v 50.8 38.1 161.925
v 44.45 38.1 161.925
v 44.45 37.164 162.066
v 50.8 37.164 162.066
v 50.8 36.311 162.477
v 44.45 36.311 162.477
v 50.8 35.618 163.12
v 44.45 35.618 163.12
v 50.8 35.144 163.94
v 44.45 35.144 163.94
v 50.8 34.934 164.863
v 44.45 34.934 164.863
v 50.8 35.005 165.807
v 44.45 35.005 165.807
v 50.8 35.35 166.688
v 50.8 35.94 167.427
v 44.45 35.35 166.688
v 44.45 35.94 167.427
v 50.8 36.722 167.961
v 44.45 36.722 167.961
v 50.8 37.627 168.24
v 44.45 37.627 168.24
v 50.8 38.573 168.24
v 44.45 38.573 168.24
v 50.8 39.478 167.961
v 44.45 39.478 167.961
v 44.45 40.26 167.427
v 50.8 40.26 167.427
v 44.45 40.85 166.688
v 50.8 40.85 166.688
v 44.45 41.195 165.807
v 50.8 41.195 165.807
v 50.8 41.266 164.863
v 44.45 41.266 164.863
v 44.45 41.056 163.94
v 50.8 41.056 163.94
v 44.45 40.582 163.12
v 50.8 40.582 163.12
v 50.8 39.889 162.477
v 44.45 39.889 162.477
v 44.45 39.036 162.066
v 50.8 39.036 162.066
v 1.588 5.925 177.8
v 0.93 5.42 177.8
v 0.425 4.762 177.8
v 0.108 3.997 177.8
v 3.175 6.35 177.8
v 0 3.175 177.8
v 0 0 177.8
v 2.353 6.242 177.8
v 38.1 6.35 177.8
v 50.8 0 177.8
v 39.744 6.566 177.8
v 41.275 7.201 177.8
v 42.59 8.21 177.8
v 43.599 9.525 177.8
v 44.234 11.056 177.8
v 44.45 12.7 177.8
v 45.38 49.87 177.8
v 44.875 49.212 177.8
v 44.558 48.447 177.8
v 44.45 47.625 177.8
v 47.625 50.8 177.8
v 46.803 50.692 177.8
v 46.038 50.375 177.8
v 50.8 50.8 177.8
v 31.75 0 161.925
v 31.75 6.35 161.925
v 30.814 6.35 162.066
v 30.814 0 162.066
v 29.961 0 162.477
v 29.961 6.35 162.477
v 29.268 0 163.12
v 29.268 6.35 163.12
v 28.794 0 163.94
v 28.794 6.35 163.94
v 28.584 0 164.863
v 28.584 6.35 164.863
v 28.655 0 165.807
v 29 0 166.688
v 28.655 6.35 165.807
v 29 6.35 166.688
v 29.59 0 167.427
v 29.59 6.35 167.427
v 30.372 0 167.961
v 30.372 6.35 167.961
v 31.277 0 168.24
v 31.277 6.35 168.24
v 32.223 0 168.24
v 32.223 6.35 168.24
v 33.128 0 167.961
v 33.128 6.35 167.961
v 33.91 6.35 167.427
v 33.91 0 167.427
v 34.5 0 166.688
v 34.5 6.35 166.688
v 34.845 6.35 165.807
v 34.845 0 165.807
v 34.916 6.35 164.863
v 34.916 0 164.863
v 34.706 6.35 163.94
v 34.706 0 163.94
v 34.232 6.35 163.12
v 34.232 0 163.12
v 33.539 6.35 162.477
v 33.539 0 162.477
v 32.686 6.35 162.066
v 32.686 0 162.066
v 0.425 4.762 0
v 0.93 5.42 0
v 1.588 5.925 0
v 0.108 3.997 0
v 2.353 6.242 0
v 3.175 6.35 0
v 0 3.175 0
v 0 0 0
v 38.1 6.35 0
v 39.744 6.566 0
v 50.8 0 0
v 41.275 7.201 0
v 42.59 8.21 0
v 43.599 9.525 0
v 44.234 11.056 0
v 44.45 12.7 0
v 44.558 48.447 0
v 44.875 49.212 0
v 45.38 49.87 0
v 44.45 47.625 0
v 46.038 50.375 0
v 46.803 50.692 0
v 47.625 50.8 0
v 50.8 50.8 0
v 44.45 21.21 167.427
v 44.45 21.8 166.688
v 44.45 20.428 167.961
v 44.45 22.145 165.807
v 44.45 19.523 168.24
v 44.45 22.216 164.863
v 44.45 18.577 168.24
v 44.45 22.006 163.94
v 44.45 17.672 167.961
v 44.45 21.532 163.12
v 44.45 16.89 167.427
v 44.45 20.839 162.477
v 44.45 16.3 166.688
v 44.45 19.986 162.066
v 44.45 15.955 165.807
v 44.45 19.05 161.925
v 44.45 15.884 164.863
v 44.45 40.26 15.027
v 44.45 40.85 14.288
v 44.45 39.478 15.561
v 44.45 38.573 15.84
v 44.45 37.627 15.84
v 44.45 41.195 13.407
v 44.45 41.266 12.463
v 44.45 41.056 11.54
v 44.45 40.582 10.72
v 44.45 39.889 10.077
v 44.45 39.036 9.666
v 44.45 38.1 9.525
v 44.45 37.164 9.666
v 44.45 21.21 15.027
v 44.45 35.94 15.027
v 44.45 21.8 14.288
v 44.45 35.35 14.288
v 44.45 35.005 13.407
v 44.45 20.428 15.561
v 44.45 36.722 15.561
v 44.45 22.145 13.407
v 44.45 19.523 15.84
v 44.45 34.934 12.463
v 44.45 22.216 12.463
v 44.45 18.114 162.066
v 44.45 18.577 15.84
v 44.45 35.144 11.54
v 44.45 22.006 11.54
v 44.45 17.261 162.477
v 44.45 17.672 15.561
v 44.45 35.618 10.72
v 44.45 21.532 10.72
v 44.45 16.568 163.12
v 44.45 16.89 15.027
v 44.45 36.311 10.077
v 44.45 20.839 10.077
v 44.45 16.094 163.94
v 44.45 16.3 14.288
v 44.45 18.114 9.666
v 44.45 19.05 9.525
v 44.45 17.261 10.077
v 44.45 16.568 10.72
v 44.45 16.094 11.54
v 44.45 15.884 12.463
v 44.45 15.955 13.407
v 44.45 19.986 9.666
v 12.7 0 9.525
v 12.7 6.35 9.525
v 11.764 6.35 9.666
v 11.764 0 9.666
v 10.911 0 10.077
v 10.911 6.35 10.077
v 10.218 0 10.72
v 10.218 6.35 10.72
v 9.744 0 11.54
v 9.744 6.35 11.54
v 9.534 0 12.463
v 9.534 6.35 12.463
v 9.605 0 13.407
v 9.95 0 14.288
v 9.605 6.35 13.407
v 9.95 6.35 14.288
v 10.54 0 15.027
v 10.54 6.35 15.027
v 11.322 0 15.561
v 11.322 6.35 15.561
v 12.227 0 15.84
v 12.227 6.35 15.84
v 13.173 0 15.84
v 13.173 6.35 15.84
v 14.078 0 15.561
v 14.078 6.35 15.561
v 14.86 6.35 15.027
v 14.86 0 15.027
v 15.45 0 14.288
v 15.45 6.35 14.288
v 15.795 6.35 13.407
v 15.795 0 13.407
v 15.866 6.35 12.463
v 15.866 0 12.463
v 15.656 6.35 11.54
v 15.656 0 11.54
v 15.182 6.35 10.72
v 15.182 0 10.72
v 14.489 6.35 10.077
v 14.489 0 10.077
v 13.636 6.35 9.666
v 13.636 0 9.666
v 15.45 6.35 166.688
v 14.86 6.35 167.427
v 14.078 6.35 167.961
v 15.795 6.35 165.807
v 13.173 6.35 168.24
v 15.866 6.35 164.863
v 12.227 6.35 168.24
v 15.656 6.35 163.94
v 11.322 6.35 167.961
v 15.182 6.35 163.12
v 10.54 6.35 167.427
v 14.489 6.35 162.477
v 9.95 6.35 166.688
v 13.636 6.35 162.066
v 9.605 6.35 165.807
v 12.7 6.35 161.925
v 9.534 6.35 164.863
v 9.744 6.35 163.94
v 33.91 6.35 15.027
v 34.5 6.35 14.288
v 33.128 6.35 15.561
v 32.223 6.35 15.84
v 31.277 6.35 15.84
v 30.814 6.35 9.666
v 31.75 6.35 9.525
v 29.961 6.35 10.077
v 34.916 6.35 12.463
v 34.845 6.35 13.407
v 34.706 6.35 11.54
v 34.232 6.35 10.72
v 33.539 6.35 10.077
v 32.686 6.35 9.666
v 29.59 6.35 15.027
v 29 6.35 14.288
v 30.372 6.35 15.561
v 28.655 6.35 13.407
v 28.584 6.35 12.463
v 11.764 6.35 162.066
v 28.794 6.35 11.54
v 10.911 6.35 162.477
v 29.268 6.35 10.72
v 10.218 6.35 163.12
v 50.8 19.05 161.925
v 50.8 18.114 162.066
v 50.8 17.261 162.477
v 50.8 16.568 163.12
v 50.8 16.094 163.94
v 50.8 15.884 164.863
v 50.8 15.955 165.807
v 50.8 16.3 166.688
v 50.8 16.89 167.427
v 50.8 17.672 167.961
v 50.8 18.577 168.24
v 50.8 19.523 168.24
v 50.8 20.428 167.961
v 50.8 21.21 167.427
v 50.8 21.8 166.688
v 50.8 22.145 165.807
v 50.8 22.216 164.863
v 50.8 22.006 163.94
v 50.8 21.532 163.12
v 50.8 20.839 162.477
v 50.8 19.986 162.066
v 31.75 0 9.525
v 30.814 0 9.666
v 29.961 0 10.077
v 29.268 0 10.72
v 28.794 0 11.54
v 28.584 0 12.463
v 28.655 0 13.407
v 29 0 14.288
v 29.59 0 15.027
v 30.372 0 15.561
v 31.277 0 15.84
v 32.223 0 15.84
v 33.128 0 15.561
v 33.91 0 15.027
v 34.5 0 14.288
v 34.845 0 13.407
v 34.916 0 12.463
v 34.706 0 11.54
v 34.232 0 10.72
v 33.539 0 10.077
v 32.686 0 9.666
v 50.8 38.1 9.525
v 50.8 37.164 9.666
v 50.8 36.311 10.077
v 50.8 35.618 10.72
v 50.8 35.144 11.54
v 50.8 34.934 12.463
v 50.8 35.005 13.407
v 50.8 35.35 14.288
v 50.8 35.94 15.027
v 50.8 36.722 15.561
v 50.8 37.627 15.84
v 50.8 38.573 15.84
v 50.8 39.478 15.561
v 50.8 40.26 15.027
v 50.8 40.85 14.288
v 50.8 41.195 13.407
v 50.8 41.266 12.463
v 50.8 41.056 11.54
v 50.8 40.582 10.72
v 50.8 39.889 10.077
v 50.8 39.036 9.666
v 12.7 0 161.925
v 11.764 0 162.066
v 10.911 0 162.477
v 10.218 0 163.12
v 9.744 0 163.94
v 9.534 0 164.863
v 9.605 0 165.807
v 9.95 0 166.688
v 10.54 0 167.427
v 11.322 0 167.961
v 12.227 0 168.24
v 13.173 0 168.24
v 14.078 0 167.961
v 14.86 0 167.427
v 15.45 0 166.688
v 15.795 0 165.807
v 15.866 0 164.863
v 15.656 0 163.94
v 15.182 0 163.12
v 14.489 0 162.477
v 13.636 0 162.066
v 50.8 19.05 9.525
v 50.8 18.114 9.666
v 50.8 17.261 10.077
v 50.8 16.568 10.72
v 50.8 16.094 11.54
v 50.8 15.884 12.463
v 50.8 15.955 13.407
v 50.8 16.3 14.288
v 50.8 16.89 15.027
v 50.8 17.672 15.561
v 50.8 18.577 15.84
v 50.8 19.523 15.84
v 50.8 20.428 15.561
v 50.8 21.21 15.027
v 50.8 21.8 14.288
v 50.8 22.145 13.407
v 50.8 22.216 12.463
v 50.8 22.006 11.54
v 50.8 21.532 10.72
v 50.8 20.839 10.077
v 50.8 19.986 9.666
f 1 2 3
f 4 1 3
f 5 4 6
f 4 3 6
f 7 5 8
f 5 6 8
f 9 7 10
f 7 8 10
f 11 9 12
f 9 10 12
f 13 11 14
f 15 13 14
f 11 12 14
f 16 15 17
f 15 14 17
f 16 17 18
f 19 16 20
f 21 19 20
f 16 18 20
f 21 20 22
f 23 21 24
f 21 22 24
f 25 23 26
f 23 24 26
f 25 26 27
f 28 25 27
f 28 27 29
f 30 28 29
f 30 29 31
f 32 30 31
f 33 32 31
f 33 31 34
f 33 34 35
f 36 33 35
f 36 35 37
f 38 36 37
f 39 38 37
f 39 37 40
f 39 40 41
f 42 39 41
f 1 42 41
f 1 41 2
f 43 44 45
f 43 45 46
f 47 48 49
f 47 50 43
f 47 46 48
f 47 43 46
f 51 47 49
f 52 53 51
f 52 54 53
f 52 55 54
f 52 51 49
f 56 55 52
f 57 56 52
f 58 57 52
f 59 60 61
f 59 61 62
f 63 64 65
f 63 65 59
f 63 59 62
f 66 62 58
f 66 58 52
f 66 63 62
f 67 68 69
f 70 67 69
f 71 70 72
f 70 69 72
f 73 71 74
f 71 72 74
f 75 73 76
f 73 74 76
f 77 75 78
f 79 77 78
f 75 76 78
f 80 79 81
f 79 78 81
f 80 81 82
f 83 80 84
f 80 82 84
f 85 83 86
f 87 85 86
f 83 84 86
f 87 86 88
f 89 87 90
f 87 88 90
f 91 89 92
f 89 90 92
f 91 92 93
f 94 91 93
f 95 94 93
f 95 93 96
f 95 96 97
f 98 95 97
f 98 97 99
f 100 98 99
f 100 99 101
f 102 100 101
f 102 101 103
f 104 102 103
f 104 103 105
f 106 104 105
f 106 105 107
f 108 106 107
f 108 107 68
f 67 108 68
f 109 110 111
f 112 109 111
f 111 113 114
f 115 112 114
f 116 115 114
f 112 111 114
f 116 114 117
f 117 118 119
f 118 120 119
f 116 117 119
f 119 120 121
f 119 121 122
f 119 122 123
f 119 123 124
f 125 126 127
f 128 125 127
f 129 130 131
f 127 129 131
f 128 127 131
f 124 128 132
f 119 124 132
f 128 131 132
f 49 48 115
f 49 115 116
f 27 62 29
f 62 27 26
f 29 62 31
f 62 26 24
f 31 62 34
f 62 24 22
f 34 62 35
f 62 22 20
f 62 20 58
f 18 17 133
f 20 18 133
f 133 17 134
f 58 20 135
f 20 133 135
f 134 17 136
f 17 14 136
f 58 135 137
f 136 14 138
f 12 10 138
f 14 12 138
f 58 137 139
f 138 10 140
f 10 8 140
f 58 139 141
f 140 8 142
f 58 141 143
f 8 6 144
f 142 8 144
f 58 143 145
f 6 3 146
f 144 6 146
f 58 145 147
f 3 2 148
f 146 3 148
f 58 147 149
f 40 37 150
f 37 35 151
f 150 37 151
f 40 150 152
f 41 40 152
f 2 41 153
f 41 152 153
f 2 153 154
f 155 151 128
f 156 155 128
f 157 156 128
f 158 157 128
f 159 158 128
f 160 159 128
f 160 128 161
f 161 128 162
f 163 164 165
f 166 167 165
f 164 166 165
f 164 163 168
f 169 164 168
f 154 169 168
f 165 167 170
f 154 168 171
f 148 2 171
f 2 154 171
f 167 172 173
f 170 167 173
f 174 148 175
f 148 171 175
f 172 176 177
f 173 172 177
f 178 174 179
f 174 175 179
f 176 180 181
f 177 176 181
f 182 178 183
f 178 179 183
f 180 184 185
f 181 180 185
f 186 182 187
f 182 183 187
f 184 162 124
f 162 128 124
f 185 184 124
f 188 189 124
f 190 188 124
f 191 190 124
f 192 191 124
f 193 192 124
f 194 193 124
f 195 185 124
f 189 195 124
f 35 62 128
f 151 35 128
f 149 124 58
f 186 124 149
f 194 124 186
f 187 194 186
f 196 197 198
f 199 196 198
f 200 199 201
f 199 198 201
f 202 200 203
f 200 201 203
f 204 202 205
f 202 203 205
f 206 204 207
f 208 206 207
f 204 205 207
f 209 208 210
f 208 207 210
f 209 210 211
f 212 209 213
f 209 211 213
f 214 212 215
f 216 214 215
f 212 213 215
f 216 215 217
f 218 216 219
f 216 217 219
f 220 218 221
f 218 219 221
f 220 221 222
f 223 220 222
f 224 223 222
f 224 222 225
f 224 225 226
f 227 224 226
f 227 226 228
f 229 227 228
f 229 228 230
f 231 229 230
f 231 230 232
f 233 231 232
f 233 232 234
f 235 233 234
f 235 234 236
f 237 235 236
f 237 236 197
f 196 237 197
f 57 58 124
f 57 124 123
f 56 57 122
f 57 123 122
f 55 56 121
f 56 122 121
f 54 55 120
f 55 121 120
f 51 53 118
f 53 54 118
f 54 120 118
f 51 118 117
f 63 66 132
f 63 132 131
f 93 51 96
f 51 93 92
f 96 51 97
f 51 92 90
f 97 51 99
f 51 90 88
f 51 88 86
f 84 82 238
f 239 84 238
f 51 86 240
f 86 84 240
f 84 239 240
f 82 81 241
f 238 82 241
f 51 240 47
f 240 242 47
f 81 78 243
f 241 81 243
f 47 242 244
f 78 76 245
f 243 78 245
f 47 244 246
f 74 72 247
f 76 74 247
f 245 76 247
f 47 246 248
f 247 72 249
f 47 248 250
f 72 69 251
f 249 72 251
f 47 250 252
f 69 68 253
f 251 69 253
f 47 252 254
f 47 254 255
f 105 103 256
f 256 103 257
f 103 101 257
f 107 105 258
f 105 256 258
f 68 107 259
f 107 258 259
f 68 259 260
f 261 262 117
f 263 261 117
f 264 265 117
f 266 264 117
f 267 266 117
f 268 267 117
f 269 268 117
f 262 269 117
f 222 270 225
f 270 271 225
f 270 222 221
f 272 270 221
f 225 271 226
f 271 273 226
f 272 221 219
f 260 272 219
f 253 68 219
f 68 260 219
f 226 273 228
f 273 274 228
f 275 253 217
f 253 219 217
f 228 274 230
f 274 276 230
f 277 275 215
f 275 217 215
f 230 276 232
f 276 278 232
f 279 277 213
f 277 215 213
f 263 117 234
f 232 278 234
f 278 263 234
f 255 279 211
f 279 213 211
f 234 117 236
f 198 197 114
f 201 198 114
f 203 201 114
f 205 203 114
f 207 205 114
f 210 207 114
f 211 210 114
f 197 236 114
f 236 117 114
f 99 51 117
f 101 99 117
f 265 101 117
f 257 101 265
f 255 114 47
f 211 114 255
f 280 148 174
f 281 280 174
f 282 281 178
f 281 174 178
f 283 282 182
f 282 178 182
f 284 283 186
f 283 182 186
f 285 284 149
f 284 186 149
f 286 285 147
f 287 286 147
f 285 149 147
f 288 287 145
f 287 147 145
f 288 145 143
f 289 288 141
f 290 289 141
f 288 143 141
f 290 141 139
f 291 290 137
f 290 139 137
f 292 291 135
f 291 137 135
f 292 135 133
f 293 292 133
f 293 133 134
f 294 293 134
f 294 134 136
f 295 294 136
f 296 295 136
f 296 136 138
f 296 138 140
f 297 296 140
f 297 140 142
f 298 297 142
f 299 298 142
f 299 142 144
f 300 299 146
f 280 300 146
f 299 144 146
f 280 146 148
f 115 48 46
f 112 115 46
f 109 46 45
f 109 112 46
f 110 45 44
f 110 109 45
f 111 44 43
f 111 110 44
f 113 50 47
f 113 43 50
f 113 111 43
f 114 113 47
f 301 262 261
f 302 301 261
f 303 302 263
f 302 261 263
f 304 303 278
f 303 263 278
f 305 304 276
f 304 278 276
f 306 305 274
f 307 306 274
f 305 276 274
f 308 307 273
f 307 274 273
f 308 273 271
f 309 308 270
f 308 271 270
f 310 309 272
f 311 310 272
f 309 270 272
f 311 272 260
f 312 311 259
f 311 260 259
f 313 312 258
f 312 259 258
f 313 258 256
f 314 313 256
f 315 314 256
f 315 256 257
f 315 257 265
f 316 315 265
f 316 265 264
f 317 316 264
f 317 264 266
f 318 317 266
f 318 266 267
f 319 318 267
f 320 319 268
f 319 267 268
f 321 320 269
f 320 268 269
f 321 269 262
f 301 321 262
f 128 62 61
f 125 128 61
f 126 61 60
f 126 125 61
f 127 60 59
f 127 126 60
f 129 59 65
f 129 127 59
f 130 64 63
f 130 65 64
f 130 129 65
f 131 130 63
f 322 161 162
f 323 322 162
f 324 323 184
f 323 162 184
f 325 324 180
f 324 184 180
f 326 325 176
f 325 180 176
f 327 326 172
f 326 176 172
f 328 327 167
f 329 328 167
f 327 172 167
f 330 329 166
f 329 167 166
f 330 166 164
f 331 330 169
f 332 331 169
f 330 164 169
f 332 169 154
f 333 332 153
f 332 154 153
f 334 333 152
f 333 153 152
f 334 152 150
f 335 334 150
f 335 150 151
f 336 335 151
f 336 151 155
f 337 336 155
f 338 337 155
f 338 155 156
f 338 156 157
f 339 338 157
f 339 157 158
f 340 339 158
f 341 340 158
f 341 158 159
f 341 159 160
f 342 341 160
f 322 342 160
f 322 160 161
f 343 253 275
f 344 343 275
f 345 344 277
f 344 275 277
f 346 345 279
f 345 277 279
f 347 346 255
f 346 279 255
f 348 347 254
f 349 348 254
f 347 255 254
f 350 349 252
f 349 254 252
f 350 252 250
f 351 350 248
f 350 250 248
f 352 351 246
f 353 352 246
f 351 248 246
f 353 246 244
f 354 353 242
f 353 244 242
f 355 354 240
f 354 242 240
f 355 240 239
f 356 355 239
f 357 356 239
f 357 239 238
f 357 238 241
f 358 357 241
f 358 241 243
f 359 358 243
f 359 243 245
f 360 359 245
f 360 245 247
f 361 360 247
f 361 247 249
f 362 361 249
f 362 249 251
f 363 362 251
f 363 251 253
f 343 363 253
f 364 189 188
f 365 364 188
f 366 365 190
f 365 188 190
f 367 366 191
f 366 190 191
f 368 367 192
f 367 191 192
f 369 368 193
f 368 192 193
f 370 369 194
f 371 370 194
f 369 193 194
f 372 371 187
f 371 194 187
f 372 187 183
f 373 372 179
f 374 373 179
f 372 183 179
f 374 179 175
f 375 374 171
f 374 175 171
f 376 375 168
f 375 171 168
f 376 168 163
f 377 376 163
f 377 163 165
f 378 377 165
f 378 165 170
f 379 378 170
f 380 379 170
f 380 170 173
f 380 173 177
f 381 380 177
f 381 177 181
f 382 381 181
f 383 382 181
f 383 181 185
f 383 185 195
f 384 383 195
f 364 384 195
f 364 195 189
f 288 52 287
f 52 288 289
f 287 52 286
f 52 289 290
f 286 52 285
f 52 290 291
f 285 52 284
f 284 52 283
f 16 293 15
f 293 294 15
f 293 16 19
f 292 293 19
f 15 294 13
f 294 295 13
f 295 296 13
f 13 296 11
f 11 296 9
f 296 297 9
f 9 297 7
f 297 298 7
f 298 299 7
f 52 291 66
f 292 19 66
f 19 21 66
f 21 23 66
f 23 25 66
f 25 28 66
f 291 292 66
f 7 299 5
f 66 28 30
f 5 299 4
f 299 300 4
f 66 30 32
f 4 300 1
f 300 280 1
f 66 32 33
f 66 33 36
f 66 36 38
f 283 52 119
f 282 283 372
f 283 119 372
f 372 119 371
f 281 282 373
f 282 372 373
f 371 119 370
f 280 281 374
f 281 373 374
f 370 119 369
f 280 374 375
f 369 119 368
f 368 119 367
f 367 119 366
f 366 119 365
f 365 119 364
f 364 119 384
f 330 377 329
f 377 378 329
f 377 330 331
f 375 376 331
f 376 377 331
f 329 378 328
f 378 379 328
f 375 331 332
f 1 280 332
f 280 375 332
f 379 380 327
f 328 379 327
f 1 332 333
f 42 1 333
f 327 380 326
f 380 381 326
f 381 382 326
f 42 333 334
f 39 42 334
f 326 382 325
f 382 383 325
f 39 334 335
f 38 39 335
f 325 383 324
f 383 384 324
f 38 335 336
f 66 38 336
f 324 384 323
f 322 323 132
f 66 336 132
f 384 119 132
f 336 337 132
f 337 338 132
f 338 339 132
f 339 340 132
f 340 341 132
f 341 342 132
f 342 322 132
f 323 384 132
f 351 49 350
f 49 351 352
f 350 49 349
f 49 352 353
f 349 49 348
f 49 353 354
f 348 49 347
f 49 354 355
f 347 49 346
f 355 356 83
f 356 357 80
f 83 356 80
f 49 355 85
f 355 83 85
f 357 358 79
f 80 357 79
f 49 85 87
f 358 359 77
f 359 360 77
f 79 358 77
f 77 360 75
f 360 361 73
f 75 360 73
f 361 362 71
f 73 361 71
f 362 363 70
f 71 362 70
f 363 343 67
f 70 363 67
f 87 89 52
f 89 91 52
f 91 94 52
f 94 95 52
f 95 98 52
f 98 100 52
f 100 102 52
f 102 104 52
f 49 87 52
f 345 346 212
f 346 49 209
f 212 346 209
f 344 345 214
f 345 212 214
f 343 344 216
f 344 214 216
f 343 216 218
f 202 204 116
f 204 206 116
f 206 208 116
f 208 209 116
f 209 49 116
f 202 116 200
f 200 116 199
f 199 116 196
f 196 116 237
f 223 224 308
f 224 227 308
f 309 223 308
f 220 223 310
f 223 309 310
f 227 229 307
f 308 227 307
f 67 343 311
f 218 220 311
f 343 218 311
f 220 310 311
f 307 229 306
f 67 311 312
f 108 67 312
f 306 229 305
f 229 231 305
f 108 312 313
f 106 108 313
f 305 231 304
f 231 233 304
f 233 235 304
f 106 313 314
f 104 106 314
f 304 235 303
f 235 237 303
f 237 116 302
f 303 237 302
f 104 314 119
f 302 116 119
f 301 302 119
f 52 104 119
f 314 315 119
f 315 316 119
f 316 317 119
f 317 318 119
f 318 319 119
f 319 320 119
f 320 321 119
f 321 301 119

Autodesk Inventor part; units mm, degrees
ref_plane "YZ Plane" through (0, 0, 0) normal (1, 0, 0) x (0, 1, 0)
ref_plane "XZ Plane" through (0, 0, 0) normal (0, 1, 0) x (-1, 0, 0)
ref_plane "XY Plane" through (0, 0, 0) normal (0, 0, 1) x (1, 0, 0)
sketch "Sketch1" plane through (0, 0, 0) normal (0, 0, 1) x (1, 0, 0)
  line L0 (0, 0) -> (50.8, 0)
  line L1 (50.8, 0) -> (50.8, 50.8)
  line L2 (50.8, 50.8) -> (47.625, 50.8)
  line L3 (44.45, 47.625) -> (44.45, 12.7)
  line L4 (38.1, 6.35) -> (3.175, 6.35)
  line L5 (0, 3.175) -> (0, 0)
  arc A0 (3.175, 6.35) -> (0, 3.175) centre (3.175, 3.175) ccw
  arc A1 (47.625, 50.8) -> (44.45, 47.625) centre (47.625, 47.625) ccw
  arc A2 (38.1, 6.35) -> (44.45, 12.7) centre (38.1, 12.7) ccw
  dimension "d0" = 50.8
  dimension "d1" = 6.35
  dimension "d2" = 3.175
  dimension "d3" = 6.35
extrude "Extrusion1" add sketch "Sketch1" along normal blind 177.8
sketch "Sketch2" plane through (0, 0, 0) normal (0, -1, 0) x (1, 0, 0)
  line L0 (0, 0) -> (50.8, 0) projected
  line L1 (0, 177.8) -> (50.8, 177.8) projected
  line L2 (0, 0) -> (0, 177.8) projected
  point P0 (12.7, 165.1)
  point P1 (31.75, 165.1)
  point P2 (12.7, 12.7)
  point P3 (31.75, 12.7)
  dimension "d6" = 19.05
  dimension "d7" = 12.7
  dimension "d8" = 12.7
  dimension "d9" = 12.7
hole "Hole1" at (12.7, 0, 165.1) at (31.75, 0, 165.1) at (12.7, 0, 12.7) at (31.75, 0, 12.7) direction (0, 1, 0) diameter 6.35 end through all
sketch "Sketch3" plane through (50.8, 0, 0) normal (1, 0, 0) x (0, 0, -1)
  line L0 (0, 0) -> (0, 50.8) projected
  line L1 (0, 50.8) -> (-177.8, 50.8) projected
  line L2 (-177.8, 0) -> (-177.8, 50.8) projected
  point P0 (-165.1, 19.05)
  point P1 (-165.1, 38.1)
  point P2 (-12.7, 19.05)
  point P3 (-12.7, 38.1)
  dimension "d17" = 19.05
  dimension "d18" = 12.7
  dimension "d19" = 12.7
  dimension "d20" = 12.7
hole "Hole2" at (50.8, 19.05, 165.1) at (50.8, 38.1, 165.1) at (50.8, 19.05, 12.7) at (50.8, 38.1, 12.7) direction (-1, 0, 0) diameter 6.35 end through all
properties part number "Right Angle" material "Aluminum 6061"
